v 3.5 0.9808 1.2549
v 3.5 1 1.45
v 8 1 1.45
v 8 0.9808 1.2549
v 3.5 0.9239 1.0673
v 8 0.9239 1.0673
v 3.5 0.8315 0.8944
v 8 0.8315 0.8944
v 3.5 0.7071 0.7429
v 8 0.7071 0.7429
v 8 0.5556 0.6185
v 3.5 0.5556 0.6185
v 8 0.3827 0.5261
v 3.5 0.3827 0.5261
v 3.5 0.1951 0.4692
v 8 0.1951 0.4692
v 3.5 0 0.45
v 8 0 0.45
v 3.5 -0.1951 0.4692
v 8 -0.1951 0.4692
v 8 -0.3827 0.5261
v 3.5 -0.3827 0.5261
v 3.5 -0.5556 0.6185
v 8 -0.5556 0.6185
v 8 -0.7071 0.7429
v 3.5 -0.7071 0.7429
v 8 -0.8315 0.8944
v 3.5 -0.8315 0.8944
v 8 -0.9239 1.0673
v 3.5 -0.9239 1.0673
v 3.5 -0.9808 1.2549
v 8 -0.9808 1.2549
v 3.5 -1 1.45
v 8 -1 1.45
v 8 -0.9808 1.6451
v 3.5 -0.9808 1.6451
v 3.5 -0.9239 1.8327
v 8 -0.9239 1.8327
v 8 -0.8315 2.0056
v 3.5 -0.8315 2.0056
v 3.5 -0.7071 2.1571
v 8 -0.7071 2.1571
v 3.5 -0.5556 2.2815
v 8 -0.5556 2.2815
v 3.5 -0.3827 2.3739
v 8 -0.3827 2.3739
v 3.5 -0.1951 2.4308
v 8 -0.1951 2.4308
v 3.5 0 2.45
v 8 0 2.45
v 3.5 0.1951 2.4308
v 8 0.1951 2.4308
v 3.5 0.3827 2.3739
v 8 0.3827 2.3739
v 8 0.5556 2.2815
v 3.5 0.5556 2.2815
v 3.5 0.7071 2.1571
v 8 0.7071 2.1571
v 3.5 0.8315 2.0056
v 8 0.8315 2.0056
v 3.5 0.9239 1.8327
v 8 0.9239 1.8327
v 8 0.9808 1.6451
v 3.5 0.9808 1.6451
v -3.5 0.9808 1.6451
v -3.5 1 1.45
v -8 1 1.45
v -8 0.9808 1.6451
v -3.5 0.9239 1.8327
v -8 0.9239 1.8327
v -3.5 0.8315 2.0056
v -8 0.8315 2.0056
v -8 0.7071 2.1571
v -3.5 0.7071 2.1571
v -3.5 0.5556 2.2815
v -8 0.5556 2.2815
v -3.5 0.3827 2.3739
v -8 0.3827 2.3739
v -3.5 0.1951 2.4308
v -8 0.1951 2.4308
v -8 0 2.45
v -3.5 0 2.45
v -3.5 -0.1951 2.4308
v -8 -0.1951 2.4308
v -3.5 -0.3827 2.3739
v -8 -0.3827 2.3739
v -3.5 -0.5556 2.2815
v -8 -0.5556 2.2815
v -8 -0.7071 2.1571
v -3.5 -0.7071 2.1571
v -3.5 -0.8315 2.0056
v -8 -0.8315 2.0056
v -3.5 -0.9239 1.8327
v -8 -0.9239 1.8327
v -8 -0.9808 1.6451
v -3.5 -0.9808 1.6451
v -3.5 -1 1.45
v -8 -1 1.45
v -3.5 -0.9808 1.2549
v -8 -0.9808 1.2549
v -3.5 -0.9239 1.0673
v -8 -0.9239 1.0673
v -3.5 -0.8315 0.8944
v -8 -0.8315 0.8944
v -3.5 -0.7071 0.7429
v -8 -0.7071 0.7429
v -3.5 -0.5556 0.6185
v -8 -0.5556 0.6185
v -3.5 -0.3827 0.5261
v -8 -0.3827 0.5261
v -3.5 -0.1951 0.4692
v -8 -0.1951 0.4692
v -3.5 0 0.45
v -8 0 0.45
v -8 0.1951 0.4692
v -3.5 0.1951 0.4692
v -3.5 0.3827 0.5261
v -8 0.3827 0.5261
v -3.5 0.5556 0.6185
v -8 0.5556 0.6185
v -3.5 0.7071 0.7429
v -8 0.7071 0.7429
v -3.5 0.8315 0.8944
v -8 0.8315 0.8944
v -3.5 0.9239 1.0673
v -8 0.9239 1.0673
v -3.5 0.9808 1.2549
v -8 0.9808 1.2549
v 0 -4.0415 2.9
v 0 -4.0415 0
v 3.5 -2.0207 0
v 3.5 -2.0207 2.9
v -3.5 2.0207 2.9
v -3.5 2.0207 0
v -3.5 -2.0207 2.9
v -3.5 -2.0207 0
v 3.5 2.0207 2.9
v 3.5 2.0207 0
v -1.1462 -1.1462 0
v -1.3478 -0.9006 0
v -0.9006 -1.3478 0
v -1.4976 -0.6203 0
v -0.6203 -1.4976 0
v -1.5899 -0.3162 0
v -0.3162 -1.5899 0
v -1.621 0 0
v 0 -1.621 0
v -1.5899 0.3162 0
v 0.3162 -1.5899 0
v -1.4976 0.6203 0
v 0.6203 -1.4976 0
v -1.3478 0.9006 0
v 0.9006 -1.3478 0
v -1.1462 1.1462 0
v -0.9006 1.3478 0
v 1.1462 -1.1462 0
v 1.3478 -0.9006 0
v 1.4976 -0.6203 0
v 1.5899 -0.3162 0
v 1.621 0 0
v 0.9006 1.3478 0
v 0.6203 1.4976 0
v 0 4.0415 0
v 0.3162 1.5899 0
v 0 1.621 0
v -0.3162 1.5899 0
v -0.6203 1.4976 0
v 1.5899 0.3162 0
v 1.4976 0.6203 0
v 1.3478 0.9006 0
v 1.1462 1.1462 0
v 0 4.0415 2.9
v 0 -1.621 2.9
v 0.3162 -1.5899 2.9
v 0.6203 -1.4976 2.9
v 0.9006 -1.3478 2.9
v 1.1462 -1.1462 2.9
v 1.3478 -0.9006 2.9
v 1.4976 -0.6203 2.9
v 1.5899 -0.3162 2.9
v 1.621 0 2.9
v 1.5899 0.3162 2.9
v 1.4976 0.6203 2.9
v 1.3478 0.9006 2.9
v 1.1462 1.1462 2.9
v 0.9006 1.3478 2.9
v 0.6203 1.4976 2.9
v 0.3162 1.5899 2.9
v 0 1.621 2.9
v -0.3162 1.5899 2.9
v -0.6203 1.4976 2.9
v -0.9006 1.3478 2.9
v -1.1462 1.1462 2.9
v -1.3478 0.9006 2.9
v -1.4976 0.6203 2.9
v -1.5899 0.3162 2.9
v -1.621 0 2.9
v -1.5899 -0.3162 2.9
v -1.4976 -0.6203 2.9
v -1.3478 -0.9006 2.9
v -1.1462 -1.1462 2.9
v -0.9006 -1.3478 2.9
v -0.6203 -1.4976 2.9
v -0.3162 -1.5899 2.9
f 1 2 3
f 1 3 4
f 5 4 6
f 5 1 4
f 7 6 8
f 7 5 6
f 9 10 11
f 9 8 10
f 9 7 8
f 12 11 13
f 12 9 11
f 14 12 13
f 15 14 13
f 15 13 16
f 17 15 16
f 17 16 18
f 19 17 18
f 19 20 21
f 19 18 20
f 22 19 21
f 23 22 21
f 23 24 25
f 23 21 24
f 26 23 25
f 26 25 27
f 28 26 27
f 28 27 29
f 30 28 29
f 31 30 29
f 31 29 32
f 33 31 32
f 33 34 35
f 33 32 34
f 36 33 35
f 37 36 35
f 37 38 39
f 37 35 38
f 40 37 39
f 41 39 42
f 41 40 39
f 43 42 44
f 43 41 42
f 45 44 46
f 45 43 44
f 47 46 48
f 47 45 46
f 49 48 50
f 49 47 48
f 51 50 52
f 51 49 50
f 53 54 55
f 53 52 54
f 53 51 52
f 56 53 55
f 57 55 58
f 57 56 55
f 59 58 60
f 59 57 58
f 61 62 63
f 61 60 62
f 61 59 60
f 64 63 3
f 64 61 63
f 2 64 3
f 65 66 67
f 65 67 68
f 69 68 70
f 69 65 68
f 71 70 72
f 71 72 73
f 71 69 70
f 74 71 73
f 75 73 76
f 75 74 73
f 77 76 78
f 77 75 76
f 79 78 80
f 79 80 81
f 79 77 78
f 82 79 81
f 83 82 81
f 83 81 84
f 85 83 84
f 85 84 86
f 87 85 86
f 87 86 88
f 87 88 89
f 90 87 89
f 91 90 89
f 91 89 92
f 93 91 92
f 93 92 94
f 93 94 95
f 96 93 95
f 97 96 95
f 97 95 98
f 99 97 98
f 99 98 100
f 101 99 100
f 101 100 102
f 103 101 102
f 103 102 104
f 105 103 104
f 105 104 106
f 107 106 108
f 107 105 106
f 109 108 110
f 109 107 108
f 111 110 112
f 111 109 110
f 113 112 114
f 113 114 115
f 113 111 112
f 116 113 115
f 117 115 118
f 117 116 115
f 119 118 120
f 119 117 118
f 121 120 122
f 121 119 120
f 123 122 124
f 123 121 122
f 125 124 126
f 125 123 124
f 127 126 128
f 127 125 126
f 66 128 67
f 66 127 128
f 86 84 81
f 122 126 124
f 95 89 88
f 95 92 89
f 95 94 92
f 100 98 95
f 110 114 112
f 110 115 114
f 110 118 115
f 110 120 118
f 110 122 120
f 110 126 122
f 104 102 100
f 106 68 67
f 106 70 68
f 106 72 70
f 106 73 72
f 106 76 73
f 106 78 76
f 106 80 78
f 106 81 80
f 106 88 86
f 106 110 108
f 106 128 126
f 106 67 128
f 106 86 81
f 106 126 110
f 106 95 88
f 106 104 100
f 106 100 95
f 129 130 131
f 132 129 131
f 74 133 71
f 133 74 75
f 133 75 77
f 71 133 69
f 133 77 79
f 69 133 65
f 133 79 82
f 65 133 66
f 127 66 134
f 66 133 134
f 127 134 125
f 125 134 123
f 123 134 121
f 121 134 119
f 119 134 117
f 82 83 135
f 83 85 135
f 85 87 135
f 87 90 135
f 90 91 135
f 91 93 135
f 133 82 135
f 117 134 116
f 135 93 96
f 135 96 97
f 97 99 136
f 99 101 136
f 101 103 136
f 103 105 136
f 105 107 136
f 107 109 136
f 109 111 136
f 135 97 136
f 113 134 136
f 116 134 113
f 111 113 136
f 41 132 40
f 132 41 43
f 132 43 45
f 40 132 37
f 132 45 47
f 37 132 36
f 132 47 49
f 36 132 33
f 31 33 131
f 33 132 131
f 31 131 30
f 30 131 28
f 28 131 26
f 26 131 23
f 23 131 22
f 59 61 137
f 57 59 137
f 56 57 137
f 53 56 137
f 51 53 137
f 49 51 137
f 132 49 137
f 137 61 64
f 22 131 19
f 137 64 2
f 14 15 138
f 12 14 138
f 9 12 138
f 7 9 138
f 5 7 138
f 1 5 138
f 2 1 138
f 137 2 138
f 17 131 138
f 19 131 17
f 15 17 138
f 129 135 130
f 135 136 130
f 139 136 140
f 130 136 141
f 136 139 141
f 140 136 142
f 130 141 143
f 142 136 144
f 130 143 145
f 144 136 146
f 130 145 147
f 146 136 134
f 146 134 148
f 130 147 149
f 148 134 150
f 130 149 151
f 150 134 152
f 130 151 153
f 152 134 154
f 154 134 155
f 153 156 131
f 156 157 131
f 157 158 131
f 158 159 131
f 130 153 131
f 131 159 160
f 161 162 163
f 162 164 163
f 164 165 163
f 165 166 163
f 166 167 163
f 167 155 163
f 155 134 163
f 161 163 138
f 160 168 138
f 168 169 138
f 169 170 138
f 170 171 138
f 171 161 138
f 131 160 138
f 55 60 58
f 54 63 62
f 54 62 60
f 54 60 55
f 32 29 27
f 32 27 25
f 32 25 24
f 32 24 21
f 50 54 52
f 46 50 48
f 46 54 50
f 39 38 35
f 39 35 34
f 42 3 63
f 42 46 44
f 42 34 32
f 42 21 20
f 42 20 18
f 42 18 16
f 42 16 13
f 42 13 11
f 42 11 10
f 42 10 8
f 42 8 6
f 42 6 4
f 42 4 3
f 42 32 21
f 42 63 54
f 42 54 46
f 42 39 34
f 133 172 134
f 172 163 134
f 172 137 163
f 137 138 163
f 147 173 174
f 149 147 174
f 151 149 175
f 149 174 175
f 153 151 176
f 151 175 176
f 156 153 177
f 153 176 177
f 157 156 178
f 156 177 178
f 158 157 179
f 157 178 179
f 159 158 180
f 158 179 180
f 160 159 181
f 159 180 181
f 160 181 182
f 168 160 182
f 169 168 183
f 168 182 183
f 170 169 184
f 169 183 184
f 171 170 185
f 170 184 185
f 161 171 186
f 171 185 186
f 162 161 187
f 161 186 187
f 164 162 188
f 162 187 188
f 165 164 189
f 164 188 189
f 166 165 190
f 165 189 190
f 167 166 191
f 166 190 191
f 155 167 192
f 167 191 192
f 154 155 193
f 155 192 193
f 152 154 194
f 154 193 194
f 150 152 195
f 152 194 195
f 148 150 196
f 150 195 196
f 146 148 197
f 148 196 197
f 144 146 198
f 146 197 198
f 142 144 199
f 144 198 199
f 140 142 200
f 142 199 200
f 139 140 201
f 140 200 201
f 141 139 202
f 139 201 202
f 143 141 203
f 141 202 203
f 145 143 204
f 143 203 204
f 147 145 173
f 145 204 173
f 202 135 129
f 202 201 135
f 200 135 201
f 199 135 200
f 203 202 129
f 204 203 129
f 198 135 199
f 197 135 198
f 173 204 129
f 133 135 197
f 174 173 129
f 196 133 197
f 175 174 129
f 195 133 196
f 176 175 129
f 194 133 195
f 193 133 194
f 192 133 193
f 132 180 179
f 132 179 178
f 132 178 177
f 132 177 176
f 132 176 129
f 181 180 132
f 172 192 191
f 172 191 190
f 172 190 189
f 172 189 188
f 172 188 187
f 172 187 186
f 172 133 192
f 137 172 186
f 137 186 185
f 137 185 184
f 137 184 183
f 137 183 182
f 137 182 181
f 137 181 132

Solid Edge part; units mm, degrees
sketch "Sketch1" plane through (0, 0, 0) normal (0, 0, 1) x (1, 0, 0)
  line L0 (3.5, 2.0207) -> (0, 4.0415)
  line L1 (0, 4.0415) -> (-3.5, 2.0207)
  line L2 (-3.5, 2.0207) -> (-3.5, -2.0207)
  line L3 (-3.5, -2.0207) -> (0, -4.0415)
  line L4 (0, -4.0415) -> (3.5, -2.0207)
  line L5 (3.5, -2.0207) -> (3.5, 2.0207)
extrude "Protrusion1" add sketch "Sketch1" along normal blind 2.9
hole "Otwór_1" at (0, 0, 2.9) direction (0, 0, -1) diameter 3.242 end up to next
sketch "Sketch2" plane through (3.5, 0, 1.45) normal (1, 0, 0) x (0, 1, 0)
  circle A0 centre (0, 0) radius 1
extrude "Wyciągnięcie_2" add sketch "Sketch2" along normal blind 4.5
mirror "Mirror1" about plane through (0, 4.0415, 2.9) normal (-1, 0, 0) of "Wyciągnięcie_2"
